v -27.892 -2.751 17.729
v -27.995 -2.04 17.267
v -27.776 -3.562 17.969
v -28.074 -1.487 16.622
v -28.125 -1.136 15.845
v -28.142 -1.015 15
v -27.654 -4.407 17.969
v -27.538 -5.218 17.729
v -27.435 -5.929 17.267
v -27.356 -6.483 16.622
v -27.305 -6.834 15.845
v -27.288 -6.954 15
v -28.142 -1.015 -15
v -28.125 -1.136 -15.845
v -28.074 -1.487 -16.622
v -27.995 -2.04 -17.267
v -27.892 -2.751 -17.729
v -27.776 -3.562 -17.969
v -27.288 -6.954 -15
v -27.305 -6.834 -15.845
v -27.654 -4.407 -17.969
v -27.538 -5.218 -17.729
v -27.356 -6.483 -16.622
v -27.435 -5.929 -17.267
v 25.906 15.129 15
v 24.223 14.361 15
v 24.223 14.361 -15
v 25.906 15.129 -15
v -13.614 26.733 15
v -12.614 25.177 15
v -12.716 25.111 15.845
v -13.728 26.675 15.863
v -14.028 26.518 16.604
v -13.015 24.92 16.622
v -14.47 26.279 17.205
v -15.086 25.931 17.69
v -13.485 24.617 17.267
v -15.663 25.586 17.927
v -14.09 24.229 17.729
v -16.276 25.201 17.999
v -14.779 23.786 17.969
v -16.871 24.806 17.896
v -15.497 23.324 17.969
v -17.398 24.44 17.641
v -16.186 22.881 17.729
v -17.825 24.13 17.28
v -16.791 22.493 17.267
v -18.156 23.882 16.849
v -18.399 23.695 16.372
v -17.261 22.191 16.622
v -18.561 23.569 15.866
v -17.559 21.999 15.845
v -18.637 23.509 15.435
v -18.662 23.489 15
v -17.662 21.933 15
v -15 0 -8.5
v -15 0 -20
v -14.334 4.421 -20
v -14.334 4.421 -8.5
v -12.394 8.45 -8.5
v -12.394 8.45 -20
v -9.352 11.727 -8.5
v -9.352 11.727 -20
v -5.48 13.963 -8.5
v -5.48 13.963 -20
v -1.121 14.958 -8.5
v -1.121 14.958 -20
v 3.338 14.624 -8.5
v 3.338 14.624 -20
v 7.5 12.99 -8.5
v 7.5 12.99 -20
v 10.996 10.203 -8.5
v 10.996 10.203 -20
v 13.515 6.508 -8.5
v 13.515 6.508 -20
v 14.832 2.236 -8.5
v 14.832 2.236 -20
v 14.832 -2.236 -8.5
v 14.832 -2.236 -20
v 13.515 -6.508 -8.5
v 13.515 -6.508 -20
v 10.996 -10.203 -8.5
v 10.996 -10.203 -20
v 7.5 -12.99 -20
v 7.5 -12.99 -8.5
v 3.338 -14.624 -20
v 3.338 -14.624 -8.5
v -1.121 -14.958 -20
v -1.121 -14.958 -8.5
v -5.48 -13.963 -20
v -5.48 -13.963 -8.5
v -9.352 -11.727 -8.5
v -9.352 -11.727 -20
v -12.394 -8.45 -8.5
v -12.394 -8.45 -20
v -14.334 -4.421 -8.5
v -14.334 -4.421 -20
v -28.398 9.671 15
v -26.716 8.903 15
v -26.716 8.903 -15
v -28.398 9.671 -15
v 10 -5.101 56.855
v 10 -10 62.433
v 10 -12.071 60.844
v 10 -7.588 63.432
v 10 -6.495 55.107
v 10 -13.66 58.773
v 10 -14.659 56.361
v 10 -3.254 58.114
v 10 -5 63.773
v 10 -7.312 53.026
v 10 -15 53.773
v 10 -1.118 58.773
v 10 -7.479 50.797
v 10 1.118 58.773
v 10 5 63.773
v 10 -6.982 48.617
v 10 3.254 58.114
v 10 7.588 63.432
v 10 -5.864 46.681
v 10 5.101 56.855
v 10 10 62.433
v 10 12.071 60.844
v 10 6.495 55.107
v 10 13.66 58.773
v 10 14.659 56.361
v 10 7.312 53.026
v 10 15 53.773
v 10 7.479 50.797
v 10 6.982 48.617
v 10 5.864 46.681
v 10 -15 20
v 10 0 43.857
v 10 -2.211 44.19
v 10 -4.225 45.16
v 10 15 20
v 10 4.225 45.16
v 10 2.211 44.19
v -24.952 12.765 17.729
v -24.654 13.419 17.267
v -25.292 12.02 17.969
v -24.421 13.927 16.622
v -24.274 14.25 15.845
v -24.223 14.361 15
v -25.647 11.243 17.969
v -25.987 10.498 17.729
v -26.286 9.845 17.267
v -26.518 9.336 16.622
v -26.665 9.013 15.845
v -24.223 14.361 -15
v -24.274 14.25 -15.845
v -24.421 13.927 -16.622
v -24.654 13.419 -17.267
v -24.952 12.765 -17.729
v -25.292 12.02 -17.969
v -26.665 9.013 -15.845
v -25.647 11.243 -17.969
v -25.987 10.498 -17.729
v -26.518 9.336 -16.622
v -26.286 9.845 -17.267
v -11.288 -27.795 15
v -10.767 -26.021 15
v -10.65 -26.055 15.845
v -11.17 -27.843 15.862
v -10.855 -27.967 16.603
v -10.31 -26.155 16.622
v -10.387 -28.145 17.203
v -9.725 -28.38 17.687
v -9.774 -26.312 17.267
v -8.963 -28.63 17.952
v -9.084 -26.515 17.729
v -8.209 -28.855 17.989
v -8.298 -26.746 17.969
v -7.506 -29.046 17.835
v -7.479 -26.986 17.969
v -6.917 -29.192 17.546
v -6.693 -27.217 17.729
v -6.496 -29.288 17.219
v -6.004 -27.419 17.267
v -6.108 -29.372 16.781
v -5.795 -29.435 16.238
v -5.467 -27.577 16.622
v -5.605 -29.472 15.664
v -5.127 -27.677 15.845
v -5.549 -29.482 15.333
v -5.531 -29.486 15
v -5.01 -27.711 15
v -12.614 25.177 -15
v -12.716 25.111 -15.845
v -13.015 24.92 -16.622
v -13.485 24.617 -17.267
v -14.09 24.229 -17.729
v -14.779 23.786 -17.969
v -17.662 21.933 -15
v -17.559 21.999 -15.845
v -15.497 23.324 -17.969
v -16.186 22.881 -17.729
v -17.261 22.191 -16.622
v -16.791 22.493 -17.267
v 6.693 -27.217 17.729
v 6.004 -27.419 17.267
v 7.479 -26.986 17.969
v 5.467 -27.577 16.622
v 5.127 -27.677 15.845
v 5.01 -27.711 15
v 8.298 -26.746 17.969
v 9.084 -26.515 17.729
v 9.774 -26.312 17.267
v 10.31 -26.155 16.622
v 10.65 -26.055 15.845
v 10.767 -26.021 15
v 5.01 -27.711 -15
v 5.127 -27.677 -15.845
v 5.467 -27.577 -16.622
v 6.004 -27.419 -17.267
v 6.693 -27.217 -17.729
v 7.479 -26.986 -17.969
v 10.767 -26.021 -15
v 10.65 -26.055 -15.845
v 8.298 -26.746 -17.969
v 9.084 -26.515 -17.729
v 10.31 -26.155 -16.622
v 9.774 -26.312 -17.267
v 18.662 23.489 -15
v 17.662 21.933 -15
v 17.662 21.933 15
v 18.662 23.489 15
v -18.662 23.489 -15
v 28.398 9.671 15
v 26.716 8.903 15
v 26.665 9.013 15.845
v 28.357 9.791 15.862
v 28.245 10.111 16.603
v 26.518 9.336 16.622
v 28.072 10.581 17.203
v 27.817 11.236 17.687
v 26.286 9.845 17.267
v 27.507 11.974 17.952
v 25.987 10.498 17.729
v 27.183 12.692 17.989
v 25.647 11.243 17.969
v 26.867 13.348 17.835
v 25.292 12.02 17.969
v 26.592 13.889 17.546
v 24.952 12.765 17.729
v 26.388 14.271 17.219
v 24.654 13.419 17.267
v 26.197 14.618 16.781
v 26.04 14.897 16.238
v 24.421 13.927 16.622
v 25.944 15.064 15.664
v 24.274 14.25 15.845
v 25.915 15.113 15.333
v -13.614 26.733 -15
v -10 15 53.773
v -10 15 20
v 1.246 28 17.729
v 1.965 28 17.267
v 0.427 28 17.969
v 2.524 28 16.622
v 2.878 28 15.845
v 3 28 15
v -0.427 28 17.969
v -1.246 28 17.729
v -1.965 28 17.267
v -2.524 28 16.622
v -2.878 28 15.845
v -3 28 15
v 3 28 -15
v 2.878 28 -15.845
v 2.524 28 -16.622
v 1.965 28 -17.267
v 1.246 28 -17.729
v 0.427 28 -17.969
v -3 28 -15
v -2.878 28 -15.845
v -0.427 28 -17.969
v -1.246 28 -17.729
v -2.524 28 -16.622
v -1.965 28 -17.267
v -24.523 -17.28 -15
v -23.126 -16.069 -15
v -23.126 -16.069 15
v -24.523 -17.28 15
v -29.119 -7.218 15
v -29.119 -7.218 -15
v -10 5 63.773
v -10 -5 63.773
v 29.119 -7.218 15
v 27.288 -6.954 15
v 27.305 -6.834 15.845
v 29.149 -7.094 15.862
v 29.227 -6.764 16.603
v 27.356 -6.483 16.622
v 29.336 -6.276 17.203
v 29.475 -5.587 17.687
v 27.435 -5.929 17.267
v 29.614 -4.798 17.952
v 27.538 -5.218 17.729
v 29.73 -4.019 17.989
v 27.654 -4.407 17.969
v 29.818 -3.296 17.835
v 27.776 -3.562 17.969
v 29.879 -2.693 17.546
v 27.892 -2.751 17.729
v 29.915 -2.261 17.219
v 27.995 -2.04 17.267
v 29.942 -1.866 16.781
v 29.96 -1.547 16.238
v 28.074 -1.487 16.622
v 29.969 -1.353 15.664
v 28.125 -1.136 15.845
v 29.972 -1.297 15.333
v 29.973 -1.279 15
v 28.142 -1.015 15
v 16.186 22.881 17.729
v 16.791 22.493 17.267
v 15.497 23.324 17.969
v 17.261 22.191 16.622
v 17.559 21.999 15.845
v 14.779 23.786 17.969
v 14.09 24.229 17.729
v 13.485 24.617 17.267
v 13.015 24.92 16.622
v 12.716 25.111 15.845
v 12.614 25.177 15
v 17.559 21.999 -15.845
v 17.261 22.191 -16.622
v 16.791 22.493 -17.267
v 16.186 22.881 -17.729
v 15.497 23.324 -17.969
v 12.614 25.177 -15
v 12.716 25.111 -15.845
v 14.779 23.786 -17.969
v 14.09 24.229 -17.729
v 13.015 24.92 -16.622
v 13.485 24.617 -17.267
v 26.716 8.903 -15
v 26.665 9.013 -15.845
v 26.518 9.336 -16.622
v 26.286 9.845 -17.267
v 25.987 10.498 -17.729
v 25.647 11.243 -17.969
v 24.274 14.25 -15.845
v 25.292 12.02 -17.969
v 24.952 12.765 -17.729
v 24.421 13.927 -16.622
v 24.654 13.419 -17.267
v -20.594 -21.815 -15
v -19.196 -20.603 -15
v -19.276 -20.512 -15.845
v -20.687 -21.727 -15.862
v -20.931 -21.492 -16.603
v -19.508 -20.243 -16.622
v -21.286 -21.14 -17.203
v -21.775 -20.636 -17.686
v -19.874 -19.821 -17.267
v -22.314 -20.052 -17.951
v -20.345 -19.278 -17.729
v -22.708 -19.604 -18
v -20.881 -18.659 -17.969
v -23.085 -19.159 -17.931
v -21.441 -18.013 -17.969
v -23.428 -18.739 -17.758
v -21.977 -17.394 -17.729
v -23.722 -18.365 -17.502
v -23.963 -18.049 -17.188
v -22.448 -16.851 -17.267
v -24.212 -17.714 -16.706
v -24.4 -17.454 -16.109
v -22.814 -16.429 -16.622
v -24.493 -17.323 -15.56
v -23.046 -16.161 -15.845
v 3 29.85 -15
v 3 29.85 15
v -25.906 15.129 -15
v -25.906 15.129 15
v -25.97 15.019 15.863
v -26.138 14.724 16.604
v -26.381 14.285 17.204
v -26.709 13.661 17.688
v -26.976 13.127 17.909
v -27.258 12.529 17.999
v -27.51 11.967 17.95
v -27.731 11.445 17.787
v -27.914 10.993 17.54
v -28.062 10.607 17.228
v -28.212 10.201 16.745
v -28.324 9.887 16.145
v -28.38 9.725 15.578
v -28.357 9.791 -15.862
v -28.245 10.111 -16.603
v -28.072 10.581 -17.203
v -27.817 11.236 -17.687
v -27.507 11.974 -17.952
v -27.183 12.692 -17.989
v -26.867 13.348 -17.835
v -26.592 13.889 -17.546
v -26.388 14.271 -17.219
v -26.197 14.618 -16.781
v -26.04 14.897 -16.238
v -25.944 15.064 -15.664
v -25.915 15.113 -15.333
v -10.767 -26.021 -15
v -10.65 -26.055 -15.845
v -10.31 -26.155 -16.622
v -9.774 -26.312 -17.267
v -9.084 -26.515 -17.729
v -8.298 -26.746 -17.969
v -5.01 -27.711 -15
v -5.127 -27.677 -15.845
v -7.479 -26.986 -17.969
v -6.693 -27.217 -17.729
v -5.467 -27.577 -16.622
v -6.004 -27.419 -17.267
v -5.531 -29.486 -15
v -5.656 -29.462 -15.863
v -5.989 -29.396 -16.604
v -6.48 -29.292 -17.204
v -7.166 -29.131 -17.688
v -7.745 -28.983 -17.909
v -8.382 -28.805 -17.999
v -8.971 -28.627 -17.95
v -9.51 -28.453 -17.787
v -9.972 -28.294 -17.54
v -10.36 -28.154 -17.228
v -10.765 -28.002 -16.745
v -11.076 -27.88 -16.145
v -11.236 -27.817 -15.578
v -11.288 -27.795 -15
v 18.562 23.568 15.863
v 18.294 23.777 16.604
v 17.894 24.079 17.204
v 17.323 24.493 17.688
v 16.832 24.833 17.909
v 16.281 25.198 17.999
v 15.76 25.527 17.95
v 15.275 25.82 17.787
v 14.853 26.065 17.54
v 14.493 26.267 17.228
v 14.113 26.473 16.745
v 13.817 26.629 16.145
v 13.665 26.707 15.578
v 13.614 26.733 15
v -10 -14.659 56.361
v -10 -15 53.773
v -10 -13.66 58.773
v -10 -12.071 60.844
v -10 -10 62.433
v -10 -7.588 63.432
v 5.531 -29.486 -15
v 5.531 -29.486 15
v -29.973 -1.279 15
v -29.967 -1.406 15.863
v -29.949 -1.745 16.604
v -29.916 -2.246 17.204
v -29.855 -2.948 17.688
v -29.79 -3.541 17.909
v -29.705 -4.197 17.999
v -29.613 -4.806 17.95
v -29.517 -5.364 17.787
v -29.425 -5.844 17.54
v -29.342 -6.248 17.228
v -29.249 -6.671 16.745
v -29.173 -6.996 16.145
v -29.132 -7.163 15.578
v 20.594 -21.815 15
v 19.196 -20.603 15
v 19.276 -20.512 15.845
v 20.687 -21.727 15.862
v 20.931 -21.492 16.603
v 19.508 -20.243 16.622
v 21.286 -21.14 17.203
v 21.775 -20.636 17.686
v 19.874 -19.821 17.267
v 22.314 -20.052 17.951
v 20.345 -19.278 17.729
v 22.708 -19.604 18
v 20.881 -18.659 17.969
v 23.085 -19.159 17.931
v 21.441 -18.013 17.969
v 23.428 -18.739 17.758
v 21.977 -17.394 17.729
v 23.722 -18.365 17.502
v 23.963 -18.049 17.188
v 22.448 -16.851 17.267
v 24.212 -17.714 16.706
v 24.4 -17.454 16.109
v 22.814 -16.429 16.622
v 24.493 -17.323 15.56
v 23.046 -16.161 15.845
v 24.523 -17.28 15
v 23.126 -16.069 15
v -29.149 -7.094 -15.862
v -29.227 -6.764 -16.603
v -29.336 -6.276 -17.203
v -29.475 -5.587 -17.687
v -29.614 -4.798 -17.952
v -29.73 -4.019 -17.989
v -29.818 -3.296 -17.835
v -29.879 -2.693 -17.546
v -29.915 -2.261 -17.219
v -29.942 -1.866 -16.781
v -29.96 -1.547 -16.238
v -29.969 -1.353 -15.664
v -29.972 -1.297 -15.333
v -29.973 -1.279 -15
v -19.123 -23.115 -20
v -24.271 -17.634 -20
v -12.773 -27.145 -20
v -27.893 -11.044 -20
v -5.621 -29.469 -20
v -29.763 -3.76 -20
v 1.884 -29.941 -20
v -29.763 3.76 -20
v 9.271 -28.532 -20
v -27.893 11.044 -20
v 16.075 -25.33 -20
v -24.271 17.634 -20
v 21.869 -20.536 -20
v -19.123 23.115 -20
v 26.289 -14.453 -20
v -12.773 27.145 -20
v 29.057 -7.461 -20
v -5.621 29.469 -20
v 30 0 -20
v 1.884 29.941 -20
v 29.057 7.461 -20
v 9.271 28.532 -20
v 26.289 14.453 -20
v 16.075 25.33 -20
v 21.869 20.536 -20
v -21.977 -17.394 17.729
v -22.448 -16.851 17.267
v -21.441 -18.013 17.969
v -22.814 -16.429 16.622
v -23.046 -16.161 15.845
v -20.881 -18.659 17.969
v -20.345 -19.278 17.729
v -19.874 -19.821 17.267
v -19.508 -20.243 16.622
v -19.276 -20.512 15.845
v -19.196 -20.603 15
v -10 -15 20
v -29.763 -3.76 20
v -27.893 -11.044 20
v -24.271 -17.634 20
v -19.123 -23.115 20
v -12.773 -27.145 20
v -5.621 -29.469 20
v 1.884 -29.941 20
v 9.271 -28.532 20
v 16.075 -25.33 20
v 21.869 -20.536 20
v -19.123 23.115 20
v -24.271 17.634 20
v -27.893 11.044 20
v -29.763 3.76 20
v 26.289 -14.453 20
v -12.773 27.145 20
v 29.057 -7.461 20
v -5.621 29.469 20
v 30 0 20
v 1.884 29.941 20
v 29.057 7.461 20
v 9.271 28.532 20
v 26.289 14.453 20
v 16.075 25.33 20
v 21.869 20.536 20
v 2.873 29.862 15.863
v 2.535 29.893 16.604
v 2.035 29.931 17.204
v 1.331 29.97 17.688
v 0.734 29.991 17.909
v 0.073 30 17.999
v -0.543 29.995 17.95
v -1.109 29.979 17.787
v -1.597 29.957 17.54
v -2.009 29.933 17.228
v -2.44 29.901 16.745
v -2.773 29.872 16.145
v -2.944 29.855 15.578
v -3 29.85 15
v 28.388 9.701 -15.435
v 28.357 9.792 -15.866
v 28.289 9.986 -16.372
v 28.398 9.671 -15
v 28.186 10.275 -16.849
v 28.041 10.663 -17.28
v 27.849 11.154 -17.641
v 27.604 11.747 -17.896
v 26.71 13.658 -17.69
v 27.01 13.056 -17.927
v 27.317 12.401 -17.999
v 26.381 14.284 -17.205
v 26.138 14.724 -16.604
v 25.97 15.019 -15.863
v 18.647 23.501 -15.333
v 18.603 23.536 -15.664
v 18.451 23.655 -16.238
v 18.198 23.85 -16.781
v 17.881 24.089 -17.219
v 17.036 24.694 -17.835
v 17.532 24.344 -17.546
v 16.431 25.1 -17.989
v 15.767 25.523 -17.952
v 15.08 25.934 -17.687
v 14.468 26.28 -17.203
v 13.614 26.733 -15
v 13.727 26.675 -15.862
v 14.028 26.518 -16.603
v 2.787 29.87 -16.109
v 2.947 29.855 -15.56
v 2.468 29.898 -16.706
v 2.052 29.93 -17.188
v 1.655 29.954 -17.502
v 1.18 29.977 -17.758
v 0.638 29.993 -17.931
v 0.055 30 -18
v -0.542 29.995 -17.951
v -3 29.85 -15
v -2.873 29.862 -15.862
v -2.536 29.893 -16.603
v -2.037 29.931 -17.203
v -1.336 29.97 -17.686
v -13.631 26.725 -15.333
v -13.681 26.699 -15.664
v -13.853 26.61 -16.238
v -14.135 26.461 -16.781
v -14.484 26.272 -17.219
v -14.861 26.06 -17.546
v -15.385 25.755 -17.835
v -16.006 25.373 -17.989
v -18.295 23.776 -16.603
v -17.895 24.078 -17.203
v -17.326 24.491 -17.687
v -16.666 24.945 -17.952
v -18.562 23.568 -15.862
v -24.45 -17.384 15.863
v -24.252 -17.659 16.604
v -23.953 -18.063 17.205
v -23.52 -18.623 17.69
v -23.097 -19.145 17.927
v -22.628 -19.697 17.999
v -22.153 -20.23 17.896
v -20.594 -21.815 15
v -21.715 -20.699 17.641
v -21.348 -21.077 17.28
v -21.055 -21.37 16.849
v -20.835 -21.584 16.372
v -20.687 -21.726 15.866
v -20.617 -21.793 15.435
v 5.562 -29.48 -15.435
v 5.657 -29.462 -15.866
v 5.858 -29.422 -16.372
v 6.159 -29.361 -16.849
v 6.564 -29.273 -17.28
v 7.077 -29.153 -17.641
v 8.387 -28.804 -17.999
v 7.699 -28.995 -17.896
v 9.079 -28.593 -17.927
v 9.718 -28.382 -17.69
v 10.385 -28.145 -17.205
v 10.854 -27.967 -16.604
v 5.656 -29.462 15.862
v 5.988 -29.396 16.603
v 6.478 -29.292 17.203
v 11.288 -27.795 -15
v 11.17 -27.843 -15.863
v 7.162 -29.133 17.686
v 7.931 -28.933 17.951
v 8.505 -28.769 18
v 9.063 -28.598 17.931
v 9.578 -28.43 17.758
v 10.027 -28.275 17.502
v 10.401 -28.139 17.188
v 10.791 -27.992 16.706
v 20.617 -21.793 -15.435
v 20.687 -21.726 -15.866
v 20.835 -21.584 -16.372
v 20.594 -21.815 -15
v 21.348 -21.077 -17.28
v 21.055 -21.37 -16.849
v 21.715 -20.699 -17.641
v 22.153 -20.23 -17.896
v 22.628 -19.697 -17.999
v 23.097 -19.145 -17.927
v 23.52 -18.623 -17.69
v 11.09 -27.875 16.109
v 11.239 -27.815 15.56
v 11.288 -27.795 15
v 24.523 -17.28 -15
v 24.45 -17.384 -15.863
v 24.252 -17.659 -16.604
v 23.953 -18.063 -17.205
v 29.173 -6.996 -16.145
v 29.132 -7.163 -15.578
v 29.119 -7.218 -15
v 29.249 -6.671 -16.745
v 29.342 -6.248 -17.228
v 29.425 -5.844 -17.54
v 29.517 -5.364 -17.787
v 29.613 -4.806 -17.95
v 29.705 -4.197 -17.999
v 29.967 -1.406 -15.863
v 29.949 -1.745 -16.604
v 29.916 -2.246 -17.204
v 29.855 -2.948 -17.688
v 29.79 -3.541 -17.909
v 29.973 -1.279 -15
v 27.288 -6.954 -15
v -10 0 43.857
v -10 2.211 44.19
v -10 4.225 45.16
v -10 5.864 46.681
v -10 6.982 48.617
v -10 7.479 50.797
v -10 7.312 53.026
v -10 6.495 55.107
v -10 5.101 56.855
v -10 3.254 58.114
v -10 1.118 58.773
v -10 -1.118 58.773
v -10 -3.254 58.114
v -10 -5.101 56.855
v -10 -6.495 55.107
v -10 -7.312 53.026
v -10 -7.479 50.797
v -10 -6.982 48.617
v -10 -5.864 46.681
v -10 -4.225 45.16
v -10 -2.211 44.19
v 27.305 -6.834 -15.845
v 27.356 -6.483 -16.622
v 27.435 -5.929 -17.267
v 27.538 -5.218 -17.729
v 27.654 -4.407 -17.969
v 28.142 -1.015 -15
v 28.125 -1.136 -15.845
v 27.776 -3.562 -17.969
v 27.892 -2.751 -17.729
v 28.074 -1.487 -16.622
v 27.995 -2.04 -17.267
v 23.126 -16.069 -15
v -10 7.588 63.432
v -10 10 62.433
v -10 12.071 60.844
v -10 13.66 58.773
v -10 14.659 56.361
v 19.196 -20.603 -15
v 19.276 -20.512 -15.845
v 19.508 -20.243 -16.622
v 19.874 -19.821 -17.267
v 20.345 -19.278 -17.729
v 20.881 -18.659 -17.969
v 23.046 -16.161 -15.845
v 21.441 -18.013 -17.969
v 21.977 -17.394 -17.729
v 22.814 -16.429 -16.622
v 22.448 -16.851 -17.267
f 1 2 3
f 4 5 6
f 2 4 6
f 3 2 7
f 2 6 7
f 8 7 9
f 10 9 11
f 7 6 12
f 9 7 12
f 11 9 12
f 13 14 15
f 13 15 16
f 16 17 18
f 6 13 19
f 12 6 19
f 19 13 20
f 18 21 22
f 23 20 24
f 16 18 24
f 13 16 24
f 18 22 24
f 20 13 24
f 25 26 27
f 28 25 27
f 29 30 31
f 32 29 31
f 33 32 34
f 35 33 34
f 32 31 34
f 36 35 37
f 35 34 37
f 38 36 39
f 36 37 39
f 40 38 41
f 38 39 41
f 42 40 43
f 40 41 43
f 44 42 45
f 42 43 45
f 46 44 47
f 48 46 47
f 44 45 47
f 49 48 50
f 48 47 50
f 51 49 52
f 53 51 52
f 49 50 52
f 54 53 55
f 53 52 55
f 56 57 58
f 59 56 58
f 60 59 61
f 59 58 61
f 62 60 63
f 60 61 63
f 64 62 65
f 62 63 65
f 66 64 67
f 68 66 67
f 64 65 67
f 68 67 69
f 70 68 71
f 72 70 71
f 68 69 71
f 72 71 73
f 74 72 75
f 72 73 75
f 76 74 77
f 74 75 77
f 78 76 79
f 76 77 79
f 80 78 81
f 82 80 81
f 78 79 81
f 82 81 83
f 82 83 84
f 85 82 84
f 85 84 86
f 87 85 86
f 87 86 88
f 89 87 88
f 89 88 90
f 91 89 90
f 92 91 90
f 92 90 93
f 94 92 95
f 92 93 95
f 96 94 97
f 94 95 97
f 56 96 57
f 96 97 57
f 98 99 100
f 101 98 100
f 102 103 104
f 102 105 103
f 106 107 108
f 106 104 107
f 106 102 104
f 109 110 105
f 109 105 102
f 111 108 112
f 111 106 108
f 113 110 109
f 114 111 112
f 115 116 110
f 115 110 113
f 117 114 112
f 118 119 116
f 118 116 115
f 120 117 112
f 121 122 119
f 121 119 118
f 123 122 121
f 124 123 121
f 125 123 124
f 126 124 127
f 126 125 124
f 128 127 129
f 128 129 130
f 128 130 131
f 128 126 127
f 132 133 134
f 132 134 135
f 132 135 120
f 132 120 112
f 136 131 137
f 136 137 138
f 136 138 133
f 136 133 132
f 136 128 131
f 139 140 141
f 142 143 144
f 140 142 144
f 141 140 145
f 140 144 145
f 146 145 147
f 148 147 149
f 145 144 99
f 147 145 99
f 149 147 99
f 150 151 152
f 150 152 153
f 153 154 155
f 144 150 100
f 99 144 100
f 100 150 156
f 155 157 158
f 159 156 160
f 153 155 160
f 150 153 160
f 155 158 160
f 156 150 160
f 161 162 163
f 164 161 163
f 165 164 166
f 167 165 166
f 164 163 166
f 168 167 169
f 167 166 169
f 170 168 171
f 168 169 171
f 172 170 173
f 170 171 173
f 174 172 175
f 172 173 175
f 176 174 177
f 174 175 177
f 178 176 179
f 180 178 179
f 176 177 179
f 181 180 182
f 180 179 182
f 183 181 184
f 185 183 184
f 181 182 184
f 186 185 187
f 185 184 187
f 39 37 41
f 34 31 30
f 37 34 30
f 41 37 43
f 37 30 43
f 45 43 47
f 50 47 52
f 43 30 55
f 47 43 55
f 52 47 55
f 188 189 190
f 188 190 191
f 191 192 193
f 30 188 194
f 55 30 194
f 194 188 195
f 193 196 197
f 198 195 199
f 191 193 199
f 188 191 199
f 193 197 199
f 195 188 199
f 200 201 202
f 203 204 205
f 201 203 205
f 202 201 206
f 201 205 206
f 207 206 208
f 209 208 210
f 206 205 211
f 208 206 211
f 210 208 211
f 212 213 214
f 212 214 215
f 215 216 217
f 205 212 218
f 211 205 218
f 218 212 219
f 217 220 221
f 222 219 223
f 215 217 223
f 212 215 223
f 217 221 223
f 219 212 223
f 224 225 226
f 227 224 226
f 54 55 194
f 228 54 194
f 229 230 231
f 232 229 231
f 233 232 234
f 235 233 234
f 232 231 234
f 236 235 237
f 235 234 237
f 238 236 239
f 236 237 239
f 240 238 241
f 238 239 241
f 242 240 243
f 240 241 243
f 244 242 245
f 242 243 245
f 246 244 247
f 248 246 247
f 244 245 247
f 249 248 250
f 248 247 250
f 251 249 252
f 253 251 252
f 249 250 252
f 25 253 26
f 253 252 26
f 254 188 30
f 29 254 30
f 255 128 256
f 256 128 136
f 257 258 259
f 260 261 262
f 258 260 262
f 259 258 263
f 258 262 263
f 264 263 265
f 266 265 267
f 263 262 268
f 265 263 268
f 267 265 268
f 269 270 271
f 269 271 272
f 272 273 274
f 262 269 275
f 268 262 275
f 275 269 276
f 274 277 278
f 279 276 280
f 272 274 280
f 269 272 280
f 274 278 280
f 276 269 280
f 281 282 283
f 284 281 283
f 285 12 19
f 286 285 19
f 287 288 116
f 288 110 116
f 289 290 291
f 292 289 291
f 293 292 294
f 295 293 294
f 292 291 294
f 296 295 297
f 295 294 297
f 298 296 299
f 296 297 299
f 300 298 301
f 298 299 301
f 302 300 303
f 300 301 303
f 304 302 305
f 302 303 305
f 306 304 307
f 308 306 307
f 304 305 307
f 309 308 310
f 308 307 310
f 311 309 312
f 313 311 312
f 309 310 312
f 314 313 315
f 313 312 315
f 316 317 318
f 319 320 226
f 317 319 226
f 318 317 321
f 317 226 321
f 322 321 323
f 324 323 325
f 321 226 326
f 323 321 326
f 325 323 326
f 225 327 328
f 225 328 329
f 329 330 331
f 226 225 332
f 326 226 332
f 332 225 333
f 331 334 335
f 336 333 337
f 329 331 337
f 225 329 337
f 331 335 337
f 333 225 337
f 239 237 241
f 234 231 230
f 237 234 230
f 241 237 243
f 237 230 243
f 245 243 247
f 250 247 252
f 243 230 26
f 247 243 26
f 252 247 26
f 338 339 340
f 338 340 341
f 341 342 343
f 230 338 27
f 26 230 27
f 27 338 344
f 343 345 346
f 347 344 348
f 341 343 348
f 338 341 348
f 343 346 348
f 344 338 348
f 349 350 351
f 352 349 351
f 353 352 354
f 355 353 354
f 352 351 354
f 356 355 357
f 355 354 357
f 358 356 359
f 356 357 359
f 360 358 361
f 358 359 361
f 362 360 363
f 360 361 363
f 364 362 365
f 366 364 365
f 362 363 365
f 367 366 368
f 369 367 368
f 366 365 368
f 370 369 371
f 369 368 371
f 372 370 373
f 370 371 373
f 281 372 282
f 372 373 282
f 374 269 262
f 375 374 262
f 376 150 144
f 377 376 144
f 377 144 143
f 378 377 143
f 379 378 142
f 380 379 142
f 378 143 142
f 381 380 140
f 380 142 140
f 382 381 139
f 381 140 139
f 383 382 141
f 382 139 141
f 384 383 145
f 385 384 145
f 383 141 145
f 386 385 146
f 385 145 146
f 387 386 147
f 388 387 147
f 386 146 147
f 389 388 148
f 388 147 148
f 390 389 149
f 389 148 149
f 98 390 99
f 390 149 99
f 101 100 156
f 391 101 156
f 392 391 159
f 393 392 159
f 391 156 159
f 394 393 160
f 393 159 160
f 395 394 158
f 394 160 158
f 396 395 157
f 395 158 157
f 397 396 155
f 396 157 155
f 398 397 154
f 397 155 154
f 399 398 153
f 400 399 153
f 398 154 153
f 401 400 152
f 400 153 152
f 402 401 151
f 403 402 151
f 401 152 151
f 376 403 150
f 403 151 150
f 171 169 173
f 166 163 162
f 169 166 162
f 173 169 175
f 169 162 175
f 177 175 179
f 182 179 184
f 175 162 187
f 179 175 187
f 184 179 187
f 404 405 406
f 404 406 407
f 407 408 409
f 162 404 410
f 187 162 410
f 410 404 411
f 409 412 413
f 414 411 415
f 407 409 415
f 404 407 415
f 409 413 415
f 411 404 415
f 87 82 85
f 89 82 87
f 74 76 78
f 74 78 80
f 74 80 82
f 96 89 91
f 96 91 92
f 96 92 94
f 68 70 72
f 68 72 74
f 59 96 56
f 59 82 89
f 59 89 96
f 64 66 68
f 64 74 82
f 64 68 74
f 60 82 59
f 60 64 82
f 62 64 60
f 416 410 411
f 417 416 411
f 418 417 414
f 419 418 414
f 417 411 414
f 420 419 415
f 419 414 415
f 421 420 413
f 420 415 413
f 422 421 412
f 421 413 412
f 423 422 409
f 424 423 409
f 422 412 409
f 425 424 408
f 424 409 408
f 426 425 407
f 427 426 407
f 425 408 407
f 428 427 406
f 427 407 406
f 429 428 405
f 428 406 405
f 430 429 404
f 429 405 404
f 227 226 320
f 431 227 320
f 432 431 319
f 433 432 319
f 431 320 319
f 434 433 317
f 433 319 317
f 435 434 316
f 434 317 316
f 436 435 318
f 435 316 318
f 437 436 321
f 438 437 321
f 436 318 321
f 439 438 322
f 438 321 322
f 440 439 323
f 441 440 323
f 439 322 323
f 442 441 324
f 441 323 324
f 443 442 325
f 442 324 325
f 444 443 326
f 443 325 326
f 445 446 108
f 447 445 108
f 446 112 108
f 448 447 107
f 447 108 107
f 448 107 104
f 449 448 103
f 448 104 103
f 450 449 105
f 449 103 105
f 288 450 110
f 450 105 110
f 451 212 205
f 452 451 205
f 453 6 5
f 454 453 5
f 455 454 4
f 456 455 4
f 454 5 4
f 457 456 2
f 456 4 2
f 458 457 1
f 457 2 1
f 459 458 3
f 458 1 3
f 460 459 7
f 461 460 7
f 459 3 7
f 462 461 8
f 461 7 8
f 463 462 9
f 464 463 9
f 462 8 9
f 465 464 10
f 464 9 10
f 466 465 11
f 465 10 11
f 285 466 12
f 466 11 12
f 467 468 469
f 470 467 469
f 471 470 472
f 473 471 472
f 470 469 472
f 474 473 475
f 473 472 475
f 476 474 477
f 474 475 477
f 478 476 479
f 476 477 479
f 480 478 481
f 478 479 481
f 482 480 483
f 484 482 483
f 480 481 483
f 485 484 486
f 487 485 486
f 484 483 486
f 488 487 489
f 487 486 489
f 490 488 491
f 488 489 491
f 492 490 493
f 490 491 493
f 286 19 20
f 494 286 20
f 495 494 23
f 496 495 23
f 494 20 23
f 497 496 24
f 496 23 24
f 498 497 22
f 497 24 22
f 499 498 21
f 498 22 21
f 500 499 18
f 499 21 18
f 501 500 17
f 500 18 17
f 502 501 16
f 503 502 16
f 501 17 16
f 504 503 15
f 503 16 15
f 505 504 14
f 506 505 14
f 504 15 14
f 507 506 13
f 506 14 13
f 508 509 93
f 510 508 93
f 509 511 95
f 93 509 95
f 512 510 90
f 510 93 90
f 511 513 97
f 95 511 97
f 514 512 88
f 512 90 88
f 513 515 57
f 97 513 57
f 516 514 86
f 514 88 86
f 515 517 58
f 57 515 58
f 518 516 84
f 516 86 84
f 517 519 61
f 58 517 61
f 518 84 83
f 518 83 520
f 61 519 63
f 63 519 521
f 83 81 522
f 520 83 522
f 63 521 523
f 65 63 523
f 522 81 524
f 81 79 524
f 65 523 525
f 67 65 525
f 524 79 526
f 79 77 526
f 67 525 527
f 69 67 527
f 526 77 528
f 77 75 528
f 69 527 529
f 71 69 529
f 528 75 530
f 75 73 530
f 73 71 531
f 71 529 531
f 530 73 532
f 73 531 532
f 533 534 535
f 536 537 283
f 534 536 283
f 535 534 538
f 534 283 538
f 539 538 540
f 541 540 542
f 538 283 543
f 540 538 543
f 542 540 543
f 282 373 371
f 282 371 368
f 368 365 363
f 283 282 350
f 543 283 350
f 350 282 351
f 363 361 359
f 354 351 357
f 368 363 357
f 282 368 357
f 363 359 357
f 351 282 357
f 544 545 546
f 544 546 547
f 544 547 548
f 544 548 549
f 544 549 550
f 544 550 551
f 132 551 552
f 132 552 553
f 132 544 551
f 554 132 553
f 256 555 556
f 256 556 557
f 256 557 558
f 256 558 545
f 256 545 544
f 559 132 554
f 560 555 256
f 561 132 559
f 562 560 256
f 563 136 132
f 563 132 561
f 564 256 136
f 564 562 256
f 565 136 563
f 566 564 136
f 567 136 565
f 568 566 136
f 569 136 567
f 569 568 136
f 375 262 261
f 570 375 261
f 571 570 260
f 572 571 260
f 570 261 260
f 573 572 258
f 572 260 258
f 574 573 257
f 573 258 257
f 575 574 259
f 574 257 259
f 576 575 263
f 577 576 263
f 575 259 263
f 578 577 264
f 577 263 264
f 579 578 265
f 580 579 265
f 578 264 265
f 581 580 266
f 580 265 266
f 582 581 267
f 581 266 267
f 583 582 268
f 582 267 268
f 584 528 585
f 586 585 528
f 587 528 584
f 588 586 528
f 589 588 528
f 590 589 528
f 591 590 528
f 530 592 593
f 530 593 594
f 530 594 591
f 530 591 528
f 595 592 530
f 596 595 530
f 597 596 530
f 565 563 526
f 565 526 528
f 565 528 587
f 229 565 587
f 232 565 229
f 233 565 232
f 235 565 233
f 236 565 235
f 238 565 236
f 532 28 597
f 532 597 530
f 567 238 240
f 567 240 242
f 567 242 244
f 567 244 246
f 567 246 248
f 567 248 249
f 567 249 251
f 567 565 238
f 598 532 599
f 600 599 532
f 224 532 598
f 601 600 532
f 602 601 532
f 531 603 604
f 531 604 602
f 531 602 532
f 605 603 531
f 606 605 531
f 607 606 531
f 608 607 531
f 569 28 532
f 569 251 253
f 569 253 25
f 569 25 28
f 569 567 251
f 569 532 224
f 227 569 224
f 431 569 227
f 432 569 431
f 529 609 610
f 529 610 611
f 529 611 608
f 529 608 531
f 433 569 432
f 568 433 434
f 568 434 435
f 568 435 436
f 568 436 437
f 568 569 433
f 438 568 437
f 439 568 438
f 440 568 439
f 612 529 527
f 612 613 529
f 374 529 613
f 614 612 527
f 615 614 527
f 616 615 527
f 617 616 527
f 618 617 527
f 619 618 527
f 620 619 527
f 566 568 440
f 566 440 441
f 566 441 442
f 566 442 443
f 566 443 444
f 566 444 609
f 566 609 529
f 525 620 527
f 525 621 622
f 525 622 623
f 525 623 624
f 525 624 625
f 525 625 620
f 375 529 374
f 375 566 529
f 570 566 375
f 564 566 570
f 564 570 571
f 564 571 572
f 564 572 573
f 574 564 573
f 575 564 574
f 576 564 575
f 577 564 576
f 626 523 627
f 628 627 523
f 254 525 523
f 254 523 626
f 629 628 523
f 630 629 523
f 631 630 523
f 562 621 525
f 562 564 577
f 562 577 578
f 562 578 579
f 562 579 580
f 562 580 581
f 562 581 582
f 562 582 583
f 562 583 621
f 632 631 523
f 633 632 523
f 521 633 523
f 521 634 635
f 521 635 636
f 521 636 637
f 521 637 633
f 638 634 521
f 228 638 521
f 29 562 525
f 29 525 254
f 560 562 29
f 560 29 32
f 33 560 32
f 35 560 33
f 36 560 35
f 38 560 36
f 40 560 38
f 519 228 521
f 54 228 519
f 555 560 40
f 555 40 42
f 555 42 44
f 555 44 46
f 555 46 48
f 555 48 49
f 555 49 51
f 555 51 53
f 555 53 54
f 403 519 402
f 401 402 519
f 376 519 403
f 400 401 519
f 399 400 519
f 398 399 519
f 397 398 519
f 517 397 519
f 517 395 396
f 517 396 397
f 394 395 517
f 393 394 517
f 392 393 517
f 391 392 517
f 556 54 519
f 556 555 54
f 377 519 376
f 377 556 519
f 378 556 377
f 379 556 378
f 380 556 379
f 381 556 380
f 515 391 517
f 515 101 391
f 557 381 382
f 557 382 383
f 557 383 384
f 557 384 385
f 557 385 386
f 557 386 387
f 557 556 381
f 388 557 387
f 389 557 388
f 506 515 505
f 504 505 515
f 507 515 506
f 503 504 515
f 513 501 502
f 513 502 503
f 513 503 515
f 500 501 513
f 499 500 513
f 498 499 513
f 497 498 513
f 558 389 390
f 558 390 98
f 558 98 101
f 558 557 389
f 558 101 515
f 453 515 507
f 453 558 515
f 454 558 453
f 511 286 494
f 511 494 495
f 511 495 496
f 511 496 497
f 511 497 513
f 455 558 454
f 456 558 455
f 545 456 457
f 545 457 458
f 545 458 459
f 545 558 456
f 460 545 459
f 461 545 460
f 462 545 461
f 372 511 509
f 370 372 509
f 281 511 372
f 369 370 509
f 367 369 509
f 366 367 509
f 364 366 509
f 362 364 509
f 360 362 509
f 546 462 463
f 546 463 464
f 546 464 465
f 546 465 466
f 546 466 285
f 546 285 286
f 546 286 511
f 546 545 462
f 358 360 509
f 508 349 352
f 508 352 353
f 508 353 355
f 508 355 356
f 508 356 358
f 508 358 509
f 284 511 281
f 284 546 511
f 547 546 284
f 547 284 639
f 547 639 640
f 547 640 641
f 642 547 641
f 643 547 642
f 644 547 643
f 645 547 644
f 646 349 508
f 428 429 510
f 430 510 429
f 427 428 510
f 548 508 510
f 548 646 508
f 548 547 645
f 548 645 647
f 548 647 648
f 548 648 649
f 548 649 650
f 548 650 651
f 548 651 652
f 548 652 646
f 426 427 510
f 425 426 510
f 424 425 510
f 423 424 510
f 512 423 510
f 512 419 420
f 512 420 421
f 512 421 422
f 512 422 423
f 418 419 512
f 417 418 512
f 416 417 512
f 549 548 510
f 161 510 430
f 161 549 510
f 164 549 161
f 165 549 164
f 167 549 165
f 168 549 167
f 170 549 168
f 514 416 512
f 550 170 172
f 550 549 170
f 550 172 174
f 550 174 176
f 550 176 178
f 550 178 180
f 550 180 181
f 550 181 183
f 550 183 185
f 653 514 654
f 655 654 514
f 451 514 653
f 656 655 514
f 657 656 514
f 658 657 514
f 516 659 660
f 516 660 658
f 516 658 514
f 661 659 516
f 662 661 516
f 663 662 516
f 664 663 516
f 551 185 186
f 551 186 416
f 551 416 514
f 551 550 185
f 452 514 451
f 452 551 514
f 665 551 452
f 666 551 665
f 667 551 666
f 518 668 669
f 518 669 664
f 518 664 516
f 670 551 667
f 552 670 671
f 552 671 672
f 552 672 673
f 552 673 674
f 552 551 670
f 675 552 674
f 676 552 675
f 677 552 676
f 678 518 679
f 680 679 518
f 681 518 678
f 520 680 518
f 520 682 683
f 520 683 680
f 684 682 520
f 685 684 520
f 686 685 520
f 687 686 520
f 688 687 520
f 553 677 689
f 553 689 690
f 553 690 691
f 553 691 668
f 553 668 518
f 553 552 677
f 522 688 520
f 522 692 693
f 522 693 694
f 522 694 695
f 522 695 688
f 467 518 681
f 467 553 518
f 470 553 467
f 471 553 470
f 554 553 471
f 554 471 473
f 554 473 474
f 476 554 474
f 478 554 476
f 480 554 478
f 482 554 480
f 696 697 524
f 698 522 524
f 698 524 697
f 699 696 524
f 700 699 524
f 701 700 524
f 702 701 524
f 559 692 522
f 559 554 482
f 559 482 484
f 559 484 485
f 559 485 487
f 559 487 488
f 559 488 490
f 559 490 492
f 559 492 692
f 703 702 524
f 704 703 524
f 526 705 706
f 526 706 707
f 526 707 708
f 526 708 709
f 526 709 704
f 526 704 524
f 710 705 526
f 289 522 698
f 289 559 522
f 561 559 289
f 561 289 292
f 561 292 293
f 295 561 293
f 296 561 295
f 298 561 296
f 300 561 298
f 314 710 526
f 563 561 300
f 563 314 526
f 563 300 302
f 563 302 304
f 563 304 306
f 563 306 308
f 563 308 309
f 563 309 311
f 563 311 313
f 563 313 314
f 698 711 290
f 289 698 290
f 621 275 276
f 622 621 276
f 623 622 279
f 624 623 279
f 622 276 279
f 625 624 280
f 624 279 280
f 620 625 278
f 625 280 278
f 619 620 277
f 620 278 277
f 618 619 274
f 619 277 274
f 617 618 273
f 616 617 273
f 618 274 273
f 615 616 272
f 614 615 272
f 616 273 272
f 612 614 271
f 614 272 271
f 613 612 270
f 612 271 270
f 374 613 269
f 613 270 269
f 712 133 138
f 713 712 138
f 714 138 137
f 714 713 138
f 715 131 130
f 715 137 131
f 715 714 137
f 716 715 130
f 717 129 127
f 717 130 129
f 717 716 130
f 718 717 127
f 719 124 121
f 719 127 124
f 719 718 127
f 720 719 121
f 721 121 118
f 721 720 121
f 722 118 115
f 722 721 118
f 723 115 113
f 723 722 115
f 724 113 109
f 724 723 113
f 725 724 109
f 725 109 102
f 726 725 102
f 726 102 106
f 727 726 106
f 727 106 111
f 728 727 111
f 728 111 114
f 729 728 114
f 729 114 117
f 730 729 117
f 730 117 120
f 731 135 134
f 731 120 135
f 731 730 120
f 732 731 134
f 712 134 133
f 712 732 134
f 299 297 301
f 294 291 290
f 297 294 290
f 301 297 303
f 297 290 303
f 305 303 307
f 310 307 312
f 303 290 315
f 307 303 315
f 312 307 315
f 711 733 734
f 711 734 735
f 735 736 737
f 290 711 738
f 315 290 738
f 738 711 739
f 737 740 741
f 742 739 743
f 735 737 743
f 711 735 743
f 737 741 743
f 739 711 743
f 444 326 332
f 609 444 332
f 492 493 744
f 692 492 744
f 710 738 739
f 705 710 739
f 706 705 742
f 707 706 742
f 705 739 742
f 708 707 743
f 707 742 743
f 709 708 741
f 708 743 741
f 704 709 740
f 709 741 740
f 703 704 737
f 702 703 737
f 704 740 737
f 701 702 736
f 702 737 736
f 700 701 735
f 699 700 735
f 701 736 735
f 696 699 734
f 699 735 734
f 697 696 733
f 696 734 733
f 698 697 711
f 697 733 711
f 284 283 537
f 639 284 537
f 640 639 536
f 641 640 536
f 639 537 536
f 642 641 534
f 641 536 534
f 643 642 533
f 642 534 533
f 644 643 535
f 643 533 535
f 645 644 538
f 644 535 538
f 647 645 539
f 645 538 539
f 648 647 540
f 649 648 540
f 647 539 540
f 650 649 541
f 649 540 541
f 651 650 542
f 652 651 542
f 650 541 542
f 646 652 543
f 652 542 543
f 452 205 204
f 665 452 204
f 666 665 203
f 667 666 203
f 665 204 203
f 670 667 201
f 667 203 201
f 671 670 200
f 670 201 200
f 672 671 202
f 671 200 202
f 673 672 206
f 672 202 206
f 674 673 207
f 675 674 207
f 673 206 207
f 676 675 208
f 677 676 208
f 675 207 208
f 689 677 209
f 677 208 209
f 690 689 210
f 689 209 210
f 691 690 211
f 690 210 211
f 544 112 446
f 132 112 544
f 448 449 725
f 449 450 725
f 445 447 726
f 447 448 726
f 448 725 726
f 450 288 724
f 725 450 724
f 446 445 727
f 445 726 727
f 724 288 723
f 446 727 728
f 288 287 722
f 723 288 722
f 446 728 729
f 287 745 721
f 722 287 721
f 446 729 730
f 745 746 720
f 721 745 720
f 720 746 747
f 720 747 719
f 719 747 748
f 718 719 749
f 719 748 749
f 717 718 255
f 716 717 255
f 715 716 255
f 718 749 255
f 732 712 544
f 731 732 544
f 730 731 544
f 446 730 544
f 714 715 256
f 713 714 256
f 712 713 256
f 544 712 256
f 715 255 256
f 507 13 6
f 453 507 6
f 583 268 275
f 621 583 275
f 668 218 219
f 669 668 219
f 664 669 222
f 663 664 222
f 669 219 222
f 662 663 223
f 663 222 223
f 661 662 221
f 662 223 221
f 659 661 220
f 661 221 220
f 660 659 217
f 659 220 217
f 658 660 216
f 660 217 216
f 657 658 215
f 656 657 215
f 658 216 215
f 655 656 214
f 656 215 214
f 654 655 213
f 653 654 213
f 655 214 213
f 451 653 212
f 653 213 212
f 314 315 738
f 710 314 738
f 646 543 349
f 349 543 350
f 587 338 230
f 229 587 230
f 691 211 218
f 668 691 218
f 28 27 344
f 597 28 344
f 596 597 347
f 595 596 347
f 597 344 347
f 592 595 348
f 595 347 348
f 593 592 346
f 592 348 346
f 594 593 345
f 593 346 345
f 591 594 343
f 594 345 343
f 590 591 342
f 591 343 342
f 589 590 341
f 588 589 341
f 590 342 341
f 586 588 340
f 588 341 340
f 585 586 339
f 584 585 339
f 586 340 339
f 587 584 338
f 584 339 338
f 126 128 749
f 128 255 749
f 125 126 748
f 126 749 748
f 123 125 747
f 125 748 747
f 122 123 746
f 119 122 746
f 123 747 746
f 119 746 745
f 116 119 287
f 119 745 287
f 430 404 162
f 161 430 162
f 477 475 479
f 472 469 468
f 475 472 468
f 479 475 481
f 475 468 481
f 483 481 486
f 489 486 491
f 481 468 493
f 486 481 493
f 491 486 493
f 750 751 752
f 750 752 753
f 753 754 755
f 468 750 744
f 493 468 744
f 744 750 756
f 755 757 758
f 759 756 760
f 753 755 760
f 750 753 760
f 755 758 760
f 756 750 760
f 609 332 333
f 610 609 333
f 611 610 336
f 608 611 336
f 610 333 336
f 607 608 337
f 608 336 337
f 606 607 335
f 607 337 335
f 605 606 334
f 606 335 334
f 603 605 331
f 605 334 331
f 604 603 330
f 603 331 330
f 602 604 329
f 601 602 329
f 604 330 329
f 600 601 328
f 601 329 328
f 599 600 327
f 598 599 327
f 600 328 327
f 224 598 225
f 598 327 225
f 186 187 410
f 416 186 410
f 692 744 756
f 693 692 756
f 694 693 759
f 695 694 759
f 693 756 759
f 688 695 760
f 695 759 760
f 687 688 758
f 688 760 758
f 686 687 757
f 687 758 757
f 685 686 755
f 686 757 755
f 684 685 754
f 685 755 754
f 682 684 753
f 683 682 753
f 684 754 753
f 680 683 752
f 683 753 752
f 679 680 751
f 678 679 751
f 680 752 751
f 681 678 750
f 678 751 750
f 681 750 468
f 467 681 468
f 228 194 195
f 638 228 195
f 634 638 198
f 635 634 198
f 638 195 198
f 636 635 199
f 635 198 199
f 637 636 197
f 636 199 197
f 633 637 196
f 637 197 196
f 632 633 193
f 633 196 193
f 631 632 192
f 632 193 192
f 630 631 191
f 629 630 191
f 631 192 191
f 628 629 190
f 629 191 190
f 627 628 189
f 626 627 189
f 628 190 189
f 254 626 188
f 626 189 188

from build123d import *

# Parameters (mm, degrees)
SKETCH1_R               = 30
BOSS_EXTRUDE1_DEPTH     = 20
SKETCH2_W               = 43.772926879
SKETCH2_H               = 30
BOSS_EXTRUDE2_DEPTH     = 10
FILLET1_R               = 10
CUT_EXTRUDE1_DEPTH      = 82.036943444
CUT_EXTRUDE1_DEPTH_BACK = 82.036943444
SKETCH3_R               = 7.5
CUT_EXTRUDE2_START      = 28
CUT_EXTRUDE2_DEPTH      = 20
CIRPATTERN1_COUNT       = 11
SKETCH5_R               = 15
CUT_EXTRUDE3_DEPTH      = 11.5


with BuildPart() as part:
    # Sketch1 → Boss-Extrude1 (new, symmetric)
    with BuildSketch(Plane.XY):
        Circle(SKETCH1_R)
    extrude(amount=BOSS_EXTRUDE1_DEPTH, both=True)

    # Sketch2 → Boss-Extrude2 (add, symmetric)
    with BuildSketch(Plane(origin=(0, 0, 0), x_dir=(0, 0, -1), z_dir=(1, 0, 0))):
        with Locations((-41.88646344, 0)):
            Rectangle(SKETCH2_W, SKETCH2_H)
    extrude(amount=BOSS_EXTRUDE2_DEPTH, both=True)

    # Fillet1
    fillet1_edges = [part.edges().sort_by_distance(p)[0] for p in [
        (0, 15, 63.772926879),
        (0, -15, 63.772926879),
    ]]
    fillet(fillet1_edges, radius=FILLET1_R)

    # Sketch3 → Cut-Extrude1 (cut, two sides: drawn at the far end of the back side and taken through both)
    with BuildSketch(Plane(origin=(10, 0, 0), x_dir=(0, 0, -1), z_dir=(1, 0, 0)).offset(-CUT_EXTRUDE1_DEPTH_BACK)):
        with Locations((-51.35721853, 0)):
            Circle(SKETCH3_R)
    extrude(amount=CUT_EXTRUDE1_DEPTH + CUT_EXTRUDE1_DEPTH_BACK, mode=Mode.SUBTRACT)

    # Sketch4 → Cut-Extrude2 (cut)
    with BuildSketch(Plane(origin=(0, 0, 0), x_dir=(1, 0, 0), z_dir=(0, 1, 0)).offset(CUT_EXTRUDE2_START)):
        with BuildLine():
            Line((3, 15), (3, -15))
            ThreePointArc((3, -15), (0, -18), (-3, -15))
            Line((-3, -15), (-3, 15))
            ThreePointArc((-3, 15), (0, 18), (3, 15))
        make_face()
    cut_extrude2 = extrude(amount=CUT_EXTRUDE2_DEPTH, mode=Mode.SUBTRACT)

    # CirPattern1: Cut-Extrude2 ×11 about axis
    cirpattern1_axis = Axis((0, 0, 0), (0, 0, 1))
    for i in range(1, CIRPATTERN1_COUNT):
        add(cut_extrude2.rotate(cirpattern1_axis, i * 360 / CIRPATTERN1_COUNT), mode=Mode.SUBTRACT)

    # Sketch5 → Cut-Extrude3 (cut)
    with BuildSketch(Plane(origin=(0, 0, -20), x_dir=(-1, 0, 0), z_dir=(0, 0, -1))):
        Circle(SKETCH5_R)
    extrude(amount=-CUT_EXTRUDE3_DEPTH, mode=Mode.SUBTRACT)


solid = part.part
